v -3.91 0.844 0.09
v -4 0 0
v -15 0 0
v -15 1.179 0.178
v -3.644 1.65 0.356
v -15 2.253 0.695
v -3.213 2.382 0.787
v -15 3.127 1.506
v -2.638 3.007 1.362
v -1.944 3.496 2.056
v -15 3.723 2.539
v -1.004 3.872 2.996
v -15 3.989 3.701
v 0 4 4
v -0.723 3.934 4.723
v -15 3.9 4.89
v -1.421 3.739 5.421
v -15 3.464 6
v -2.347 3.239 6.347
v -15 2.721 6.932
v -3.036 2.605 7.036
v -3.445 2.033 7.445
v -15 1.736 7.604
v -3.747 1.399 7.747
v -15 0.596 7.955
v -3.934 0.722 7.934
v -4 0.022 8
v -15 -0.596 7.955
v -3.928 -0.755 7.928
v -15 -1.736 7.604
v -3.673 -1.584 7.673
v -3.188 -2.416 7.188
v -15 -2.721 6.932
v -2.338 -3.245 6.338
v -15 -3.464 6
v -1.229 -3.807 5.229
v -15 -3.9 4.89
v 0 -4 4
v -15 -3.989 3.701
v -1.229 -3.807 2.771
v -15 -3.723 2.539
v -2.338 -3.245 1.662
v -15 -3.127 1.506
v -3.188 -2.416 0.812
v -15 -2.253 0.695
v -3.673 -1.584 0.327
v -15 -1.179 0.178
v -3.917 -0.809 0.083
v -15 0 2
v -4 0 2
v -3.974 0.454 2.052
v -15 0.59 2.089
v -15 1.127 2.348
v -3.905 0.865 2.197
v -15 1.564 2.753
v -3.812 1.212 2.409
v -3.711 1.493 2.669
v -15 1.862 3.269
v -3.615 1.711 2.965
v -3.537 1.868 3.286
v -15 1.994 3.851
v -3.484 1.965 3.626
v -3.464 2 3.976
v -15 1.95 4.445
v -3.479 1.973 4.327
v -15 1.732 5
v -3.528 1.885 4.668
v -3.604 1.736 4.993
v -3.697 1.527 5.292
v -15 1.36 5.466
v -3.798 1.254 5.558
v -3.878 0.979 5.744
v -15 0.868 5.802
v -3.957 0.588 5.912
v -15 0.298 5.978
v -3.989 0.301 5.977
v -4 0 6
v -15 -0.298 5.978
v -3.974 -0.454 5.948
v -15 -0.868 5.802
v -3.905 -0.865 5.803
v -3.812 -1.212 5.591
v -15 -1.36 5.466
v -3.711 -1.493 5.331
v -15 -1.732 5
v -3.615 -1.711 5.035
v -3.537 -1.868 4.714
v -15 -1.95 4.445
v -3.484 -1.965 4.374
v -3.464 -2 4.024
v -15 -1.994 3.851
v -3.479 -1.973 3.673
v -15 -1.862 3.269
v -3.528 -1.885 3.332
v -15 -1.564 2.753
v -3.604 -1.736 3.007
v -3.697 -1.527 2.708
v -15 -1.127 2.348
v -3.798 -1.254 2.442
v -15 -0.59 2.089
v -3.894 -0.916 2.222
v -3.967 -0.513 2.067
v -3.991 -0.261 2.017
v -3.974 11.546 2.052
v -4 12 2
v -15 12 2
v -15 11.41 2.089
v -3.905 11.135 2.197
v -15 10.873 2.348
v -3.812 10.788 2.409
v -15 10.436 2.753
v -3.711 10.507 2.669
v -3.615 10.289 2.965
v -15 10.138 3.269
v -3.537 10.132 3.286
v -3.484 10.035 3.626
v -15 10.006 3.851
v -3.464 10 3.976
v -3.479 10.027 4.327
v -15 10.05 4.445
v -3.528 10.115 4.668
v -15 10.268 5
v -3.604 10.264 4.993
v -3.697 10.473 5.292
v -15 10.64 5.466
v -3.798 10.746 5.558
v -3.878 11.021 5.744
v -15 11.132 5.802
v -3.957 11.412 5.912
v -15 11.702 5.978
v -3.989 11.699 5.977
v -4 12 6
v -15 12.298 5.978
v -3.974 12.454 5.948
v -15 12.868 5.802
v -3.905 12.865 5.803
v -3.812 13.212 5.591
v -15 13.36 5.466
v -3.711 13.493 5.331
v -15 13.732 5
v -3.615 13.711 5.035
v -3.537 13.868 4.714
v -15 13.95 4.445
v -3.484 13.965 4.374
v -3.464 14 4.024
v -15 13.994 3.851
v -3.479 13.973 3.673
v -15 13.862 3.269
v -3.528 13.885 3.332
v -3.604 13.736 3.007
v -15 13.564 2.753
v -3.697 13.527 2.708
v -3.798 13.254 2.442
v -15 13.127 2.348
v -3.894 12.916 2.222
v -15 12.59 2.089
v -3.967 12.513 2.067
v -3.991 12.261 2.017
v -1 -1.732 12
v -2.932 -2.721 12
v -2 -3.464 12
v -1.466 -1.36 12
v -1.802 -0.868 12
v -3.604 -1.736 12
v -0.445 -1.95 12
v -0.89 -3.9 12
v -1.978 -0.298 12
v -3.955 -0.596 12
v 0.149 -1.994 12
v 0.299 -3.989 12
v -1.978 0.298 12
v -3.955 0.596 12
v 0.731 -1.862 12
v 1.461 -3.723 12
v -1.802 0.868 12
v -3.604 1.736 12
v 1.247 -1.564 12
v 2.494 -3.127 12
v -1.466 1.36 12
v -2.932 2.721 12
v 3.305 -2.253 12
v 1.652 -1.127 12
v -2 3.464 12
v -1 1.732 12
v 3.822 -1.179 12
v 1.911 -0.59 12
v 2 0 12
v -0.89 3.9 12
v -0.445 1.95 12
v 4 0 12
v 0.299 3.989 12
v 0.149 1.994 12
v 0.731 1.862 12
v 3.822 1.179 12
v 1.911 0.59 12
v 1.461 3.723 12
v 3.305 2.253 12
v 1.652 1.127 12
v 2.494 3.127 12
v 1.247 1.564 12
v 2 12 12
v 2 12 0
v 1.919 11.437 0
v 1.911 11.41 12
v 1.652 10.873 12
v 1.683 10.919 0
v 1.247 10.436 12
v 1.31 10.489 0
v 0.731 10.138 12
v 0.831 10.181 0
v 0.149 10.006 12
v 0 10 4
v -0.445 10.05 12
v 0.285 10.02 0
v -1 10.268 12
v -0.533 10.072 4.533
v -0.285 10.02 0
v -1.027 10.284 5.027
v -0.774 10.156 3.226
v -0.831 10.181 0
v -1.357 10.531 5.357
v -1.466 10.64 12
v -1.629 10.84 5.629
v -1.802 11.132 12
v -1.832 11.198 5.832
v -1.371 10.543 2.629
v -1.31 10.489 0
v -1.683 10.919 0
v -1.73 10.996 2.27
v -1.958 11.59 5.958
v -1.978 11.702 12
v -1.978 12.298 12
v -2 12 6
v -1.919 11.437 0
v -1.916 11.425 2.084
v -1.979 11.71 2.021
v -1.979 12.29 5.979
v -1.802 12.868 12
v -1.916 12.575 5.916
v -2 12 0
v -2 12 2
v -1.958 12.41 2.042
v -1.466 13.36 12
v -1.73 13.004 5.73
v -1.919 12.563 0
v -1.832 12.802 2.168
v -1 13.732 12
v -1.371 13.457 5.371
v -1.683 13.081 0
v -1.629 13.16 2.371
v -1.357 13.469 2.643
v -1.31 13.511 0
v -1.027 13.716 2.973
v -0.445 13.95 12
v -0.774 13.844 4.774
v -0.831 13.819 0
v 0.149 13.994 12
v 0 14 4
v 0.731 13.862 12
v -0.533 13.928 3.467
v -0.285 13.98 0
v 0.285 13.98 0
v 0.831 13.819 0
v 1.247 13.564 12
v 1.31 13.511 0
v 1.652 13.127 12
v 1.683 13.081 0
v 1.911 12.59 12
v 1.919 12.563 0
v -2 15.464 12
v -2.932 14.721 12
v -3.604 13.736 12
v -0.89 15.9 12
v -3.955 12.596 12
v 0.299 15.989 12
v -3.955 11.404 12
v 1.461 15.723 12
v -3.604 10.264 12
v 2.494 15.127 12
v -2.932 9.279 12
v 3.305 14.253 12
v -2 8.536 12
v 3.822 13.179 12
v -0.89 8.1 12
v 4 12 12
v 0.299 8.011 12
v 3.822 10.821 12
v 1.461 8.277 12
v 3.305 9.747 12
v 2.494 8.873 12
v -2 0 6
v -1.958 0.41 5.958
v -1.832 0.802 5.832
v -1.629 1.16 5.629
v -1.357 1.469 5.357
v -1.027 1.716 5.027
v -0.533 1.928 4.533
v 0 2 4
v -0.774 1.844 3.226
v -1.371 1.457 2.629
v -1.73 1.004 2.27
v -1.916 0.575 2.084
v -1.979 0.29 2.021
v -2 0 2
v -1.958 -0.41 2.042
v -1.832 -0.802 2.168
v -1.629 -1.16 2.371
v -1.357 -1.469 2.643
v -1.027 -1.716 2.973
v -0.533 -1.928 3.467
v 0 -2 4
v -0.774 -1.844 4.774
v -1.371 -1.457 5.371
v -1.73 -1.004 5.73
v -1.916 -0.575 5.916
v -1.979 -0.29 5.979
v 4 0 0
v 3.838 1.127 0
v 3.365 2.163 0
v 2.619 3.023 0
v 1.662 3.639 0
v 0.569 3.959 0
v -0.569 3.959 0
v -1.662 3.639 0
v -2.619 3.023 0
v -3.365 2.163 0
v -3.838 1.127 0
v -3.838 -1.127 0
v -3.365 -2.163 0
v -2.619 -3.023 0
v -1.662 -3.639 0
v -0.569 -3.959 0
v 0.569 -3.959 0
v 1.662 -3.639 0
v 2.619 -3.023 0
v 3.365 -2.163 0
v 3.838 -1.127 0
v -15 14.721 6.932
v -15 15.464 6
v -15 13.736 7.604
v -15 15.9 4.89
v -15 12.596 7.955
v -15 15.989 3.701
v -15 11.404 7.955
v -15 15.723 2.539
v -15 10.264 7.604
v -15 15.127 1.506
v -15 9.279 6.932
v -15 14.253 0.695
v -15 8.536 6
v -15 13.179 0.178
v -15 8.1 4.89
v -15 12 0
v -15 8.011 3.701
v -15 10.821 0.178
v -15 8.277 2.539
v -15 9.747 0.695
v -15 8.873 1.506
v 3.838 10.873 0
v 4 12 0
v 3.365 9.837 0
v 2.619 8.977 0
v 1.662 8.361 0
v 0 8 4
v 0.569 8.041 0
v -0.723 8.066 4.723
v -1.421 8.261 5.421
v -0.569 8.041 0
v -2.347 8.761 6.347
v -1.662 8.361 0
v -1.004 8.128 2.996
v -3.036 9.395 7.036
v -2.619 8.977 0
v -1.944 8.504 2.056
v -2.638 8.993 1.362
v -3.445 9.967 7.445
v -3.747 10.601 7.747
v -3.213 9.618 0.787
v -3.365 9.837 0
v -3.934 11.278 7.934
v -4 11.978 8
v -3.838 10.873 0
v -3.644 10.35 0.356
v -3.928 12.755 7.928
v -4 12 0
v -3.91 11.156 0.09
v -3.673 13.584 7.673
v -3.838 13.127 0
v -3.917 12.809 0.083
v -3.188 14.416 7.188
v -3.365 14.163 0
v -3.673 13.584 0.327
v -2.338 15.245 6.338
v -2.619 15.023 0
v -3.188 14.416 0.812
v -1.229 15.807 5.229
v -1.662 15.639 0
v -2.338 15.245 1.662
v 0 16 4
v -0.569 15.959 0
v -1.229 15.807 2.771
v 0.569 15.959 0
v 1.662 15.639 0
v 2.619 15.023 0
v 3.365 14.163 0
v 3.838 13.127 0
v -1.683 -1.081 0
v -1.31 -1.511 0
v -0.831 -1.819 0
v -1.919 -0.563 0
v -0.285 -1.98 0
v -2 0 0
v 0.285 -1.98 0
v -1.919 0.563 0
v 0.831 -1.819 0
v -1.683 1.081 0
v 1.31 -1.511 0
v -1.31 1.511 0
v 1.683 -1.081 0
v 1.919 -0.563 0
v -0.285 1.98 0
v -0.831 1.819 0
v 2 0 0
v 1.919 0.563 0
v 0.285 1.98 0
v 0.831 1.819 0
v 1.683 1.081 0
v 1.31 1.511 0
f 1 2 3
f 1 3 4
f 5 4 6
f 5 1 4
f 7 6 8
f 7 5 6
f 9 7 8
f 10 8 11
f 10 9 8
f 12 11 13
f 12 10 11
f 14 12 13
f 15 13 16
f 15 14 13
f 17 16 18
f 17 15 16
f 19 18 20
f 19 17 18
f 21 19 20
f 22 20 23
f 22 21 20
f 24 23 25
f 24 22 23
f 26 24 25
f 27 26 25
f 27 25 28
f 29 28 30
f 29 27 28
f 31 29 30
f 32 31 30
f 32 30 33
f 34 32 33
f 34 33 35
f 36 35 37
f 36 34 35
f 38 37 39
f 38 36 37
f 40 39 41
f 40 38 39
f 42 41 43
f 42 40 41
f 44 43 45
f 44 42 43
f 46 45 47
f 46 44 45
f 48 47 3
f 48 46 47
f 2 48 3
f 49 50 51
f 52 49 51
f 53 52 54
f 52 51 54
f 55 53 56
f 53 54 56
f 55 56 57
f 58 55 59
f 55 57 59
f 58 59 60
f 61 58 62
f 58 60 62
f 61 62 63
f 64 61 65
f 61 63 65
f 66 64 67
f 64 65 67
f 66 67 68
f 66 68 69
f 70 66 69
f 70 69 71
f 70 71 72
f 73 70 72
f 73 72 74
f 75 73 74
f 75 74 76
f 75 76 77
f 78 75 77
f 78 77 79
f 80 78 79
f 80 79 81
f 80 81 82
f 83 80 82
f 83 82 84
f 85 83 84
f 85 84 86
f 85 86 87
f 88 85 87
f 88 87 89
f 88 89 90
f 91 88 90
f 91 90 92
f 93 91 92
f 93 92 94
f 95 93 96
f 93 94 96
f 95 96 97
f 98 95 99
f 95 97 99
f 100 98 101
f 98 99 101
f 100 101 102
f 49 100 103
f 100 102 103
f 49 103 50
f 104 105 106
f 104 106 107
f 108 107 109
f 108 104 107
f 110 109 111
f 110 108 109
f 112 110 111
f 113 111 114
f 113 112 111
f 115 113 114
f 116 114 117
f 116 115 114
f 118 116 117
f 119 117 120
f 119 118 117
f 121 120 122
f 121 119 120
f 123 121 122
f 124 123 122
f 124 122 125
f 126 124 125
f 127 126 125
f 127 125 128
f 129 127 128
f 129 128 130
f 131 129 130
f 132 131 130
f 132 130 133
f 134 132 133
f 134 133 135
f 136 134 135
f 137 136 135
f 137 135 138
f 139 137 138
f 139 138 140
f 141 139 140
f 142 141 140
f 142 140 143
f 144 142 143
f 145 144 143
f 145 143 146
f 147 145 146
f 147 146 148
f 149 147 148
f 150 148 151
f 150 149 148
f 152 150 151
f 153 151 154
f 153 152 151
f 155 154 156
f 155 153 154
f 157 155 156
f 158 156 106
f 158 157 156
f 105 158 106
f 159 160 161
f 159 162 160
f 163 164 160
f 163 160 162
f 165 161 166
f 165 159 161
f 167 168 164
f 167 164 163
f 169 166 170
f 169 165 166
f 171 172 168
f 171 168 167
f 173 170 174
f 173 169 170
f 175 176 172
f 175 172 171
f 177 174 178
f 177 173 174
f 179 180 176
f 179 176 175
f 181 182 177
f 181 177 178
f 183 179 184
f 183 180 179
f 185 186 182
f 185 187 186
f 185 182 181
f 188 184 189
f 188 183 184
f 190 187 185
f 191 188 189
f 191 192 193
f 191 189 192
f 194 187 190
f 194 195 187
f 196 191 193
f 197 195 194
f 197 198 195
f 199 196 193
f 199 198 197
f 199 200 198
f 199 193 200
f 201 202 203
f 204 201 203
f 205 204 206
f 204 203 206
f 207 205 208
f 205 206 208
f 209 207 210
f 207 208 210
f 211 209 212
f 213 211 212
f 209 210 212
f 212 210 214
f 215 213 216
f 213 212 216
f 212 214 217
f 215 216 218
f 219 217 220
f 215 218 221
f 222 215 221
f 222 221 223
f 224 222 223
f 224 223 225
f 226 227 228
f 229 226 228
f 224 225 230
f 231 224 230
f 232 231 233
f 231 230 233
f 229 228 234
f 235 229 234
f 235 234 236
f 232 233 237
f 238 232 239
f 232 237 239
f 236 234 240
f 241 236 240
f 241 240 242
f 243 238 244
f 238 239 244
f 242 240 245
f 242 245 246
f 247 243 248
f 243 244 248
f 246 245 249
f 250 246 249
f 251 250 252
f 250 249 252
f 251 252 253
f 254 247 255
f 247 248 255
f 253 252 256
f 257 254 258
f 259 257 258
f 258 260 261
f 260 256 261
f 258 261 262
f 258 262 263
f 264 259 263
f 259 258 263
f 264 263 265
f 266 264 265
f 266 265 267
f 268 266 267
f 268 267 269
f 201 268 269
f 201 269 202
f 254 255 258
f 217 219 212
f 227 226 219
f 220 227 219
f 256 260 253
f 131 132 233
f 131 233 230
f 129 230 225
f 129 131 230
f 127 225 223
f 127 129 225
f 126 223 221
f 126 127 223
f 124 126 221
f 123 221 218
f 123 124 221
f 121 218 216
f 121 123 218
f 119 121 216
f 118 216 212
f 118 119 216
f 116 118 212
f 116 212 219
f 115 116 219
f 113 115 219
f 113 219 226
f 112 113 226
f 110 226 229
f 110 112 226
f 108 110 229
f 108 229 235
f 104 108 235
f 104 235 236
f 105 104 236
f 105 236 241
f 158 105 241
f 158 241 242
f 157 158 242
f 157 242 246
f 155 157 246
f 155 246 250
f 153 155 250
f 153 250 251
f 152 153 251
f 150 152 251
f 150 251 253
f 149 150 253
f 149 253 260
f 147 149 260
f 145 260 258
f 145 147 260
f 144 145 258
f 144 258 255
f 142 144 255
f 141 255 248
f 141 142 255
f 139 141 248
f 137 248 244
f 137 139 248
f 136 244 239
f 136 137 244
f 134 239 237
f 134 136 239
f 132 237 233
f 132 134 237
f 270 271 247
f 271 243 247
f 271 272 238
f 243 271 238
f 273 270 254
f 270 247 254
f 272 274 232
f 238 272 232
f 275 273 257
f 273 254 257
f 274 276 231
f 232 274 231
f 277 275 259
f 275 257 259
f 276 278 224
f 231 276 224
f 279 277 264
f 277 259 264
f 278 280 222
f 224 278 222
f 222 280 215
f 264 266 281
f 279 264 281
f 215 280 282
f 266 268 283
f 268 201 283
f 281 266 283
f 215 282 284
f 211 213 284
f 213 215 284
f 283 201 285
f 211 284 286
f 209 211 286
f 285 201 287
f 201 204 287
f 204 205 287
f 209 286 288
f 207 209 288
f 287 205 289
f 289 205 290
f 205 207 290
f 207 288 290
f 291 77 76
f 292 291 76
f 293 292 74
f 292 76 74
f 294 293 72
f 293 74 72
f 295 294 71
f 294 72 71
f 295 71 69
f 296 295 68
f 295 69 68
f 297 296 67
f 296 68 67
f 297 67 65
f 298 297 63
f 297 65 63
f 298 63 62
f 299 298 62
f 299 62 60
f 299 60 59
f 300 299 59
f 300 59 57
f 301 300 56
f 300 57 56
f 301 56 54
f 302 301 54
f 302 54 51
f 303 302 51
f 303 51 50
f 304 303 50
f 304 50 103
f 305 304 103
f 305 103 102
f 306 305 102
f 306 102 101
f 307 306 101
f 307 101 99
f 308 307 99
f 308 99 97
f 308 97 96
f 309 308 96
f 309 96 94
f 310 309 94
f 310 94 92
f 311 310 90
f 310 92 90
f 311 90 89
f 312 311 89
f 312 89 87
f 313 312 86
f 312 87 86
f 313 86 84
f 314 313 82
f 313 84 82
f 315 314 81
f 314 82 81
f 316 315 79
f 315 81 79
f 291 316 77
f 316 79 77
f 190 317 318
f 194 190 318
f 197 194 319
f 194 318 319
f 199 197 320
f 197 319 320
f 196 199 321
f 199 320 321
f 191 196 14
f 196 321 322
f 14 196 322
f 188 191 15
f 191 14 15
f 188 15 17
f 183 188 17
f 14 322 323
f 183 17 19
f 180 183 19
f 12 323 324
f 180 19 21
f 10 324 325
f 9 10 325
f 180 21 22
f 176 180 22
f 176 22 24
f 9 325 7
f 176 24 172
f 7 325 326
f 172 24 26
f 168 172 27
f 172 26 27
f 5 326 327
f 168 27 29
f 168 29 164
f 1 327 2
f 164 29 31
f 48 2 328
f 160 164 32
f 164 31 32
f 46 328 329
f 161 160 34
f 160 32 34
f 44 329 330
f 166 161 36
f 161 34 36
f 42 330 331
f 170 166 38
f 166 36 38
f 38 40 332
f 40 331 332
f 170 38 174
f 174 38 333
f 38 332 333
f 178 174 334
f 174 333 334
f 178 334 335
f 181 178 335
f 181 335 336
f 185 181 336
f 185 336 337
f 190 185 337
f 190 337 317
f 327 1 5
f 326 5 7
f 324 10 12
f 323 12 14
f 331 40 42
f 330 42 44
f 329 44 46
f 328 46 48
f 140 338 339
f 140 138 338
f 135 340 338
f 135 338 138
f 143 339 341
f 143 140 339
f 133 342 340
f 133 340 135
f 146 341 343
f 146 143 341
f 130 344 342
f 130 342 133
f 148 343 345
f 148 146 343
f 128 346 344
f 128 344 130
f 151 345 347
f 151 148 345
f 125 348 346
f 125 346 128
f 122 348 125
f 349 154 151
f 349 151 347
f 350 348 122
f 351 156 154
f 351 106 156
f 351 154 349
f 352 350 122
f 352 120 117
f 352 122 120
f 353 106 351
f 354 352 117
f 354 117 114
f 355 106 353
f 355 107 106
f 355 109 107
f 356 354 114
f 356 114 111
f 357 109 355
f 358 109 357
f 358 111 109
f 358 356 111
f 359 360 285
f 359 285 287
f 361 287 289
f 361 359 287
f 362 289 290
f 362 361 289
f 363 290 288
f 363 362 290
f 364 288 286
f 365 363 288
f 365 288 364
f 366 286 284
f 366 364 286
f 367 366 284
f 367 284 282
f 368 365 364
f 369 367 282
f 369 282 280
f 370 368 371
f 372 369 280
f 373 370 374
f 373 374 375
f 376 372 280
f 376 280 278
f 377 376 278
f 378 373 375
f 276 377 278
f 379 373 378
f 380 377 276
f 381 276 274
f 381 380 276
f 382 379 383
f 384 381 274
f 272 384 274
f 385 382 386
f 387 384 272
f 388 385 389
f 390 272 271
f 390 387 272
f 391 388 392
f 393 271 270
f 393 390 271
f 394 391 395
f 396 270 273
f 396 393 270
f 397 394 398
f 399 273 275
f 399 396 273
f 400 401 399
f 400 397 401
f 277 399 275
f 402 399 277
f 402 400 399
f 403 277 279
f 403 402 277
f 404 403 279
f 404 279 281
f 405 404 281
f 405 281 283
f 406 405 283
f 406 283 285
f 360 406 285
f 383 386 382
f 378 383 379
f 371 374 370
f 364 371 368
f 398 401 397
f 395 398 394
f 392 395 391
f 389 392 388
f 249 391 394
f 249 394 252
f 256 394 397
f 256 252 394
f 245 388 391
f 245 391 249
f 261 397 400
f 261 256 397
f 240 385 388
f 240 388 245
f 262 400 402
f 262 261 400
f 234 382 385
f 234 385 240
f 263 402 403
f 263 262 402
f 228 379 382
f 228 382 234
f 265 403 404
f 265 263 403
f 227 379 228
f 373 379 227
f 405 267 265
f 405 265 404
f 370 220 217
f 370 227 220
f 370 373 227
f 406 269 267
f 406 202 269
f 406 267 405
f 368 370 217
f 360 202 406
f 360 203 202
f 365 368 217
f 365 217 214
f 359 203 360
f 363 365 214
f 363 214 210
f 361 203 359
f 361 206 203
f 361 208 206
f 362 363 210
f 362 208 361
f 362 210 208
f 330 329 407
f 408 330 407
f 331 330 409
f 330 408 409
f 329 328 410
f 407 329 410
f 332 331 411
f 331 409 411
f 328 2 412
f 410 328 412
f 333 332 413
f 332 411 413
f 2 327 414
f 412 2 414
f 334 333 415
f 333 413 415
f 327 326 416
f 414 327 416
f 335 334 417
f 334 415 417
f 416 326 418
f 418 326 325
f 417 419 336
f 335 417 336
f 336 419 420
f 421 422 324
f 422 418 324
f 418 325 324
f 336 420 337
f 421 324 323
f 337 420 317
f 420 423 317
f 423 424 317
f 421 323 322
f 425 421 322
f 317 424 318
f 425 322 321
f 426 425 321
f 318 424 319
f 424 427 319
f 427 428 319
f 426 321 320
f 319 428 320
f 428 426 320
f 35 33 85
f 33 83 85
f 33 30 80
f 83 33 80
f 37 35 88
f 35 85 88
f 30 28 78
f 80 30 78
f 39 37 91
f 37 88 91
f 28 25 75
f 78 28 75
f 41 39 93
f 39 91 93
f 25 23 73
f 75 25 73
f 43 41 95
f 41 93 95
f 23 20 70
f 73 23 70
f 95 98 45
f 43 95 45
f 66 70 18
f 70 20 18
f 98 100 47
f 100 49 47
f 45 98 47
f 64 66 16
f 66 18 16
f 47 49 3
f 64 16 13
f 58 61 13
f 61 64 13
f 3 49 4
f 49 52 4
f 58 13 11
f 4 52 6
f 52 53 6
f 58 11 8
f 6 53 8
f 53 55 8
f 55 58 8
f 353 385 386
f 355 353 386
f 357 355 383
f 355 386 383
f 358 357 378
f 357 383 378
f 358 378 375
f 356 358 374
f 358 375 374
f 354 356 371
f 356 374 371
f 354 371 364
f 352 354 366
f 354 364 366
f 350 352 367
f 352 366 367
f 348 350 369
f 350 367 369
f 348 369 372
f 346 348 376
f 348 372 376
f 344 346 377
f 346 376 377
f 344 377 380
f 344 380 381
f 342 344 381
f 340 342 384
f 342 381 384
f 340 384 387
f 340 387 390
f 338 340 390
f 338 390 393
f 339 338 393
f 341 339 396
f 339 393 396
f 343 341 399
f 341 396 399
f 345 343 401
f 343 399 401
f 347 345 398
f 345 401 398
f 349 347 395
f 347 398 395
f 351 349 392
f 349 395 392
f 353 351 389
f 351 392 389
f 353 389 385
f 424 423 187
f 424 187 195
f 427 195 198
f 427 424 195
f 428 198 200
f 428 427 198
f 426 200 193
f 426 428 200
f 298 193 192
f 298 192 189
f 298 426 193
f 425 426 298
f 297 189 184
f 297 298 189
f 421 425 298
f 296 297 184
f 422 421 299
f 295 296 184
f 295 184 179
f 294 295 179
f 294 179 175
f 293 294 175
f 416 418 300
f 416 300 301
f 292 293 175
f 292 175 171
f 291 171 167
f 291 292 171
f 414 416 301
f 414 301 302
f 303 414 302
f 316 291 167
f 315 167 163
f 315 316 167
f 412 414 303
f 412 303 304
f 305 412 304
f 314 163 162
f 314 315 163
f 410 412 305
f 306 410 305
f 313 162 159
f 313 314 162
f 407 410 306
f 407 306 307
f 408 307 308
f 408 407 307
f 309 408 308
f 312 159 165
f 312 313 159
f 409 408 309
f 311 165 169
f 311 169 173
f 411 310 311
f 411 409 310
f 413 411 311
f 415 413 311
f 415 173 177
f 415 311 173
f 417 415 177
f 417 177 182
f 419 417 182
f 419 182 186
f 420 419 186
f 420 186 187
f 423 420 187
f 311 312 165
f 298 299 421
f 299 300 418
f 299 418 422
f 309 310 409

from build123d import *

# Parameters (mm, degrees)
SKETCH1_R           = 4
SKETCH1_R_2         = 2
BOSS_EXTRUDE1_DEPTH = 12
SKETCH2_R           = 4
SKETCH2_R_2         = 2
BOSS_EXTRUDE2_DEPTH = 15
SKETCH3_R           = 2
CUT_EXTRUDE1_DEPTH  = 13.0000001
CUT_EXTRUDE2_REACH  = 21
SKETCH4_R           = 2


with BuildPart() as part:
    # Sketch1 → Boss-Extrude1 (new body)
    with BuildSketch(Plane.XY):
        Circle(SKETCH1_R)
        Circle(SKETCH1_R_2, mode=Mode.SUBTRACT)
    extrude(amount=BOSS_EXTRUDE1_DEPTH)

    # Sketch2 → Boss-Extrude2 (add)
    with BuildSketch(Plane(origin=(0, 0, 0), x_dir=(0, 0, -1), z_dir=(1, 0, 0))):
        with Locations((-4, 0)):
            Circle(SKETCH2_R)
        with Locations((-4, 0)):
            Circle(SKETCH2_R_2, mode=Mode.SUBTRACT)
    extrude(amount=-BOSS_EXTRUDE2_DEPTH)

    # Sketch3 → Cut-Extrude1 (cut, through all)
    with BuildSketch(Plane(origin=(0, 0, 0), x_dir=(-1, 0, 0), z_dir=(0, 0, -1))):
        Circle(SKETCH3_R)
    extrude(amount=-CUT_EXTRUDE1_DEPTH, mode=Mode.SUBTRACT)

    # Sketch4 → Cut-Extrude2 (cut, up to next)
    with BuildSketch(Plane.ZY.offset(15), mode=Mode.PRIVATE) as cut_extrude2_sk1:
        with Locations((4, 0)):
            Circle(SKETCH4_R)
    cut_extrude2_tool1 = extrude(cut_extrude2_sk1.sketch, amount=-CUT_EXTRUDE2_REACH, mode=Mode.PRIVATE) & part.part
    add(cut_extrude2_tool1.solids().sort_by_distance((-15, 0, 4))[0], mode=Mode.SUBTRACT)


with BuildPart() as body_2:
    # Mirror1: mirrored copy
    add(part.part.mirror(Plane.ZX.offset(6)))


solid = Compound([part.part, body_2.part])
